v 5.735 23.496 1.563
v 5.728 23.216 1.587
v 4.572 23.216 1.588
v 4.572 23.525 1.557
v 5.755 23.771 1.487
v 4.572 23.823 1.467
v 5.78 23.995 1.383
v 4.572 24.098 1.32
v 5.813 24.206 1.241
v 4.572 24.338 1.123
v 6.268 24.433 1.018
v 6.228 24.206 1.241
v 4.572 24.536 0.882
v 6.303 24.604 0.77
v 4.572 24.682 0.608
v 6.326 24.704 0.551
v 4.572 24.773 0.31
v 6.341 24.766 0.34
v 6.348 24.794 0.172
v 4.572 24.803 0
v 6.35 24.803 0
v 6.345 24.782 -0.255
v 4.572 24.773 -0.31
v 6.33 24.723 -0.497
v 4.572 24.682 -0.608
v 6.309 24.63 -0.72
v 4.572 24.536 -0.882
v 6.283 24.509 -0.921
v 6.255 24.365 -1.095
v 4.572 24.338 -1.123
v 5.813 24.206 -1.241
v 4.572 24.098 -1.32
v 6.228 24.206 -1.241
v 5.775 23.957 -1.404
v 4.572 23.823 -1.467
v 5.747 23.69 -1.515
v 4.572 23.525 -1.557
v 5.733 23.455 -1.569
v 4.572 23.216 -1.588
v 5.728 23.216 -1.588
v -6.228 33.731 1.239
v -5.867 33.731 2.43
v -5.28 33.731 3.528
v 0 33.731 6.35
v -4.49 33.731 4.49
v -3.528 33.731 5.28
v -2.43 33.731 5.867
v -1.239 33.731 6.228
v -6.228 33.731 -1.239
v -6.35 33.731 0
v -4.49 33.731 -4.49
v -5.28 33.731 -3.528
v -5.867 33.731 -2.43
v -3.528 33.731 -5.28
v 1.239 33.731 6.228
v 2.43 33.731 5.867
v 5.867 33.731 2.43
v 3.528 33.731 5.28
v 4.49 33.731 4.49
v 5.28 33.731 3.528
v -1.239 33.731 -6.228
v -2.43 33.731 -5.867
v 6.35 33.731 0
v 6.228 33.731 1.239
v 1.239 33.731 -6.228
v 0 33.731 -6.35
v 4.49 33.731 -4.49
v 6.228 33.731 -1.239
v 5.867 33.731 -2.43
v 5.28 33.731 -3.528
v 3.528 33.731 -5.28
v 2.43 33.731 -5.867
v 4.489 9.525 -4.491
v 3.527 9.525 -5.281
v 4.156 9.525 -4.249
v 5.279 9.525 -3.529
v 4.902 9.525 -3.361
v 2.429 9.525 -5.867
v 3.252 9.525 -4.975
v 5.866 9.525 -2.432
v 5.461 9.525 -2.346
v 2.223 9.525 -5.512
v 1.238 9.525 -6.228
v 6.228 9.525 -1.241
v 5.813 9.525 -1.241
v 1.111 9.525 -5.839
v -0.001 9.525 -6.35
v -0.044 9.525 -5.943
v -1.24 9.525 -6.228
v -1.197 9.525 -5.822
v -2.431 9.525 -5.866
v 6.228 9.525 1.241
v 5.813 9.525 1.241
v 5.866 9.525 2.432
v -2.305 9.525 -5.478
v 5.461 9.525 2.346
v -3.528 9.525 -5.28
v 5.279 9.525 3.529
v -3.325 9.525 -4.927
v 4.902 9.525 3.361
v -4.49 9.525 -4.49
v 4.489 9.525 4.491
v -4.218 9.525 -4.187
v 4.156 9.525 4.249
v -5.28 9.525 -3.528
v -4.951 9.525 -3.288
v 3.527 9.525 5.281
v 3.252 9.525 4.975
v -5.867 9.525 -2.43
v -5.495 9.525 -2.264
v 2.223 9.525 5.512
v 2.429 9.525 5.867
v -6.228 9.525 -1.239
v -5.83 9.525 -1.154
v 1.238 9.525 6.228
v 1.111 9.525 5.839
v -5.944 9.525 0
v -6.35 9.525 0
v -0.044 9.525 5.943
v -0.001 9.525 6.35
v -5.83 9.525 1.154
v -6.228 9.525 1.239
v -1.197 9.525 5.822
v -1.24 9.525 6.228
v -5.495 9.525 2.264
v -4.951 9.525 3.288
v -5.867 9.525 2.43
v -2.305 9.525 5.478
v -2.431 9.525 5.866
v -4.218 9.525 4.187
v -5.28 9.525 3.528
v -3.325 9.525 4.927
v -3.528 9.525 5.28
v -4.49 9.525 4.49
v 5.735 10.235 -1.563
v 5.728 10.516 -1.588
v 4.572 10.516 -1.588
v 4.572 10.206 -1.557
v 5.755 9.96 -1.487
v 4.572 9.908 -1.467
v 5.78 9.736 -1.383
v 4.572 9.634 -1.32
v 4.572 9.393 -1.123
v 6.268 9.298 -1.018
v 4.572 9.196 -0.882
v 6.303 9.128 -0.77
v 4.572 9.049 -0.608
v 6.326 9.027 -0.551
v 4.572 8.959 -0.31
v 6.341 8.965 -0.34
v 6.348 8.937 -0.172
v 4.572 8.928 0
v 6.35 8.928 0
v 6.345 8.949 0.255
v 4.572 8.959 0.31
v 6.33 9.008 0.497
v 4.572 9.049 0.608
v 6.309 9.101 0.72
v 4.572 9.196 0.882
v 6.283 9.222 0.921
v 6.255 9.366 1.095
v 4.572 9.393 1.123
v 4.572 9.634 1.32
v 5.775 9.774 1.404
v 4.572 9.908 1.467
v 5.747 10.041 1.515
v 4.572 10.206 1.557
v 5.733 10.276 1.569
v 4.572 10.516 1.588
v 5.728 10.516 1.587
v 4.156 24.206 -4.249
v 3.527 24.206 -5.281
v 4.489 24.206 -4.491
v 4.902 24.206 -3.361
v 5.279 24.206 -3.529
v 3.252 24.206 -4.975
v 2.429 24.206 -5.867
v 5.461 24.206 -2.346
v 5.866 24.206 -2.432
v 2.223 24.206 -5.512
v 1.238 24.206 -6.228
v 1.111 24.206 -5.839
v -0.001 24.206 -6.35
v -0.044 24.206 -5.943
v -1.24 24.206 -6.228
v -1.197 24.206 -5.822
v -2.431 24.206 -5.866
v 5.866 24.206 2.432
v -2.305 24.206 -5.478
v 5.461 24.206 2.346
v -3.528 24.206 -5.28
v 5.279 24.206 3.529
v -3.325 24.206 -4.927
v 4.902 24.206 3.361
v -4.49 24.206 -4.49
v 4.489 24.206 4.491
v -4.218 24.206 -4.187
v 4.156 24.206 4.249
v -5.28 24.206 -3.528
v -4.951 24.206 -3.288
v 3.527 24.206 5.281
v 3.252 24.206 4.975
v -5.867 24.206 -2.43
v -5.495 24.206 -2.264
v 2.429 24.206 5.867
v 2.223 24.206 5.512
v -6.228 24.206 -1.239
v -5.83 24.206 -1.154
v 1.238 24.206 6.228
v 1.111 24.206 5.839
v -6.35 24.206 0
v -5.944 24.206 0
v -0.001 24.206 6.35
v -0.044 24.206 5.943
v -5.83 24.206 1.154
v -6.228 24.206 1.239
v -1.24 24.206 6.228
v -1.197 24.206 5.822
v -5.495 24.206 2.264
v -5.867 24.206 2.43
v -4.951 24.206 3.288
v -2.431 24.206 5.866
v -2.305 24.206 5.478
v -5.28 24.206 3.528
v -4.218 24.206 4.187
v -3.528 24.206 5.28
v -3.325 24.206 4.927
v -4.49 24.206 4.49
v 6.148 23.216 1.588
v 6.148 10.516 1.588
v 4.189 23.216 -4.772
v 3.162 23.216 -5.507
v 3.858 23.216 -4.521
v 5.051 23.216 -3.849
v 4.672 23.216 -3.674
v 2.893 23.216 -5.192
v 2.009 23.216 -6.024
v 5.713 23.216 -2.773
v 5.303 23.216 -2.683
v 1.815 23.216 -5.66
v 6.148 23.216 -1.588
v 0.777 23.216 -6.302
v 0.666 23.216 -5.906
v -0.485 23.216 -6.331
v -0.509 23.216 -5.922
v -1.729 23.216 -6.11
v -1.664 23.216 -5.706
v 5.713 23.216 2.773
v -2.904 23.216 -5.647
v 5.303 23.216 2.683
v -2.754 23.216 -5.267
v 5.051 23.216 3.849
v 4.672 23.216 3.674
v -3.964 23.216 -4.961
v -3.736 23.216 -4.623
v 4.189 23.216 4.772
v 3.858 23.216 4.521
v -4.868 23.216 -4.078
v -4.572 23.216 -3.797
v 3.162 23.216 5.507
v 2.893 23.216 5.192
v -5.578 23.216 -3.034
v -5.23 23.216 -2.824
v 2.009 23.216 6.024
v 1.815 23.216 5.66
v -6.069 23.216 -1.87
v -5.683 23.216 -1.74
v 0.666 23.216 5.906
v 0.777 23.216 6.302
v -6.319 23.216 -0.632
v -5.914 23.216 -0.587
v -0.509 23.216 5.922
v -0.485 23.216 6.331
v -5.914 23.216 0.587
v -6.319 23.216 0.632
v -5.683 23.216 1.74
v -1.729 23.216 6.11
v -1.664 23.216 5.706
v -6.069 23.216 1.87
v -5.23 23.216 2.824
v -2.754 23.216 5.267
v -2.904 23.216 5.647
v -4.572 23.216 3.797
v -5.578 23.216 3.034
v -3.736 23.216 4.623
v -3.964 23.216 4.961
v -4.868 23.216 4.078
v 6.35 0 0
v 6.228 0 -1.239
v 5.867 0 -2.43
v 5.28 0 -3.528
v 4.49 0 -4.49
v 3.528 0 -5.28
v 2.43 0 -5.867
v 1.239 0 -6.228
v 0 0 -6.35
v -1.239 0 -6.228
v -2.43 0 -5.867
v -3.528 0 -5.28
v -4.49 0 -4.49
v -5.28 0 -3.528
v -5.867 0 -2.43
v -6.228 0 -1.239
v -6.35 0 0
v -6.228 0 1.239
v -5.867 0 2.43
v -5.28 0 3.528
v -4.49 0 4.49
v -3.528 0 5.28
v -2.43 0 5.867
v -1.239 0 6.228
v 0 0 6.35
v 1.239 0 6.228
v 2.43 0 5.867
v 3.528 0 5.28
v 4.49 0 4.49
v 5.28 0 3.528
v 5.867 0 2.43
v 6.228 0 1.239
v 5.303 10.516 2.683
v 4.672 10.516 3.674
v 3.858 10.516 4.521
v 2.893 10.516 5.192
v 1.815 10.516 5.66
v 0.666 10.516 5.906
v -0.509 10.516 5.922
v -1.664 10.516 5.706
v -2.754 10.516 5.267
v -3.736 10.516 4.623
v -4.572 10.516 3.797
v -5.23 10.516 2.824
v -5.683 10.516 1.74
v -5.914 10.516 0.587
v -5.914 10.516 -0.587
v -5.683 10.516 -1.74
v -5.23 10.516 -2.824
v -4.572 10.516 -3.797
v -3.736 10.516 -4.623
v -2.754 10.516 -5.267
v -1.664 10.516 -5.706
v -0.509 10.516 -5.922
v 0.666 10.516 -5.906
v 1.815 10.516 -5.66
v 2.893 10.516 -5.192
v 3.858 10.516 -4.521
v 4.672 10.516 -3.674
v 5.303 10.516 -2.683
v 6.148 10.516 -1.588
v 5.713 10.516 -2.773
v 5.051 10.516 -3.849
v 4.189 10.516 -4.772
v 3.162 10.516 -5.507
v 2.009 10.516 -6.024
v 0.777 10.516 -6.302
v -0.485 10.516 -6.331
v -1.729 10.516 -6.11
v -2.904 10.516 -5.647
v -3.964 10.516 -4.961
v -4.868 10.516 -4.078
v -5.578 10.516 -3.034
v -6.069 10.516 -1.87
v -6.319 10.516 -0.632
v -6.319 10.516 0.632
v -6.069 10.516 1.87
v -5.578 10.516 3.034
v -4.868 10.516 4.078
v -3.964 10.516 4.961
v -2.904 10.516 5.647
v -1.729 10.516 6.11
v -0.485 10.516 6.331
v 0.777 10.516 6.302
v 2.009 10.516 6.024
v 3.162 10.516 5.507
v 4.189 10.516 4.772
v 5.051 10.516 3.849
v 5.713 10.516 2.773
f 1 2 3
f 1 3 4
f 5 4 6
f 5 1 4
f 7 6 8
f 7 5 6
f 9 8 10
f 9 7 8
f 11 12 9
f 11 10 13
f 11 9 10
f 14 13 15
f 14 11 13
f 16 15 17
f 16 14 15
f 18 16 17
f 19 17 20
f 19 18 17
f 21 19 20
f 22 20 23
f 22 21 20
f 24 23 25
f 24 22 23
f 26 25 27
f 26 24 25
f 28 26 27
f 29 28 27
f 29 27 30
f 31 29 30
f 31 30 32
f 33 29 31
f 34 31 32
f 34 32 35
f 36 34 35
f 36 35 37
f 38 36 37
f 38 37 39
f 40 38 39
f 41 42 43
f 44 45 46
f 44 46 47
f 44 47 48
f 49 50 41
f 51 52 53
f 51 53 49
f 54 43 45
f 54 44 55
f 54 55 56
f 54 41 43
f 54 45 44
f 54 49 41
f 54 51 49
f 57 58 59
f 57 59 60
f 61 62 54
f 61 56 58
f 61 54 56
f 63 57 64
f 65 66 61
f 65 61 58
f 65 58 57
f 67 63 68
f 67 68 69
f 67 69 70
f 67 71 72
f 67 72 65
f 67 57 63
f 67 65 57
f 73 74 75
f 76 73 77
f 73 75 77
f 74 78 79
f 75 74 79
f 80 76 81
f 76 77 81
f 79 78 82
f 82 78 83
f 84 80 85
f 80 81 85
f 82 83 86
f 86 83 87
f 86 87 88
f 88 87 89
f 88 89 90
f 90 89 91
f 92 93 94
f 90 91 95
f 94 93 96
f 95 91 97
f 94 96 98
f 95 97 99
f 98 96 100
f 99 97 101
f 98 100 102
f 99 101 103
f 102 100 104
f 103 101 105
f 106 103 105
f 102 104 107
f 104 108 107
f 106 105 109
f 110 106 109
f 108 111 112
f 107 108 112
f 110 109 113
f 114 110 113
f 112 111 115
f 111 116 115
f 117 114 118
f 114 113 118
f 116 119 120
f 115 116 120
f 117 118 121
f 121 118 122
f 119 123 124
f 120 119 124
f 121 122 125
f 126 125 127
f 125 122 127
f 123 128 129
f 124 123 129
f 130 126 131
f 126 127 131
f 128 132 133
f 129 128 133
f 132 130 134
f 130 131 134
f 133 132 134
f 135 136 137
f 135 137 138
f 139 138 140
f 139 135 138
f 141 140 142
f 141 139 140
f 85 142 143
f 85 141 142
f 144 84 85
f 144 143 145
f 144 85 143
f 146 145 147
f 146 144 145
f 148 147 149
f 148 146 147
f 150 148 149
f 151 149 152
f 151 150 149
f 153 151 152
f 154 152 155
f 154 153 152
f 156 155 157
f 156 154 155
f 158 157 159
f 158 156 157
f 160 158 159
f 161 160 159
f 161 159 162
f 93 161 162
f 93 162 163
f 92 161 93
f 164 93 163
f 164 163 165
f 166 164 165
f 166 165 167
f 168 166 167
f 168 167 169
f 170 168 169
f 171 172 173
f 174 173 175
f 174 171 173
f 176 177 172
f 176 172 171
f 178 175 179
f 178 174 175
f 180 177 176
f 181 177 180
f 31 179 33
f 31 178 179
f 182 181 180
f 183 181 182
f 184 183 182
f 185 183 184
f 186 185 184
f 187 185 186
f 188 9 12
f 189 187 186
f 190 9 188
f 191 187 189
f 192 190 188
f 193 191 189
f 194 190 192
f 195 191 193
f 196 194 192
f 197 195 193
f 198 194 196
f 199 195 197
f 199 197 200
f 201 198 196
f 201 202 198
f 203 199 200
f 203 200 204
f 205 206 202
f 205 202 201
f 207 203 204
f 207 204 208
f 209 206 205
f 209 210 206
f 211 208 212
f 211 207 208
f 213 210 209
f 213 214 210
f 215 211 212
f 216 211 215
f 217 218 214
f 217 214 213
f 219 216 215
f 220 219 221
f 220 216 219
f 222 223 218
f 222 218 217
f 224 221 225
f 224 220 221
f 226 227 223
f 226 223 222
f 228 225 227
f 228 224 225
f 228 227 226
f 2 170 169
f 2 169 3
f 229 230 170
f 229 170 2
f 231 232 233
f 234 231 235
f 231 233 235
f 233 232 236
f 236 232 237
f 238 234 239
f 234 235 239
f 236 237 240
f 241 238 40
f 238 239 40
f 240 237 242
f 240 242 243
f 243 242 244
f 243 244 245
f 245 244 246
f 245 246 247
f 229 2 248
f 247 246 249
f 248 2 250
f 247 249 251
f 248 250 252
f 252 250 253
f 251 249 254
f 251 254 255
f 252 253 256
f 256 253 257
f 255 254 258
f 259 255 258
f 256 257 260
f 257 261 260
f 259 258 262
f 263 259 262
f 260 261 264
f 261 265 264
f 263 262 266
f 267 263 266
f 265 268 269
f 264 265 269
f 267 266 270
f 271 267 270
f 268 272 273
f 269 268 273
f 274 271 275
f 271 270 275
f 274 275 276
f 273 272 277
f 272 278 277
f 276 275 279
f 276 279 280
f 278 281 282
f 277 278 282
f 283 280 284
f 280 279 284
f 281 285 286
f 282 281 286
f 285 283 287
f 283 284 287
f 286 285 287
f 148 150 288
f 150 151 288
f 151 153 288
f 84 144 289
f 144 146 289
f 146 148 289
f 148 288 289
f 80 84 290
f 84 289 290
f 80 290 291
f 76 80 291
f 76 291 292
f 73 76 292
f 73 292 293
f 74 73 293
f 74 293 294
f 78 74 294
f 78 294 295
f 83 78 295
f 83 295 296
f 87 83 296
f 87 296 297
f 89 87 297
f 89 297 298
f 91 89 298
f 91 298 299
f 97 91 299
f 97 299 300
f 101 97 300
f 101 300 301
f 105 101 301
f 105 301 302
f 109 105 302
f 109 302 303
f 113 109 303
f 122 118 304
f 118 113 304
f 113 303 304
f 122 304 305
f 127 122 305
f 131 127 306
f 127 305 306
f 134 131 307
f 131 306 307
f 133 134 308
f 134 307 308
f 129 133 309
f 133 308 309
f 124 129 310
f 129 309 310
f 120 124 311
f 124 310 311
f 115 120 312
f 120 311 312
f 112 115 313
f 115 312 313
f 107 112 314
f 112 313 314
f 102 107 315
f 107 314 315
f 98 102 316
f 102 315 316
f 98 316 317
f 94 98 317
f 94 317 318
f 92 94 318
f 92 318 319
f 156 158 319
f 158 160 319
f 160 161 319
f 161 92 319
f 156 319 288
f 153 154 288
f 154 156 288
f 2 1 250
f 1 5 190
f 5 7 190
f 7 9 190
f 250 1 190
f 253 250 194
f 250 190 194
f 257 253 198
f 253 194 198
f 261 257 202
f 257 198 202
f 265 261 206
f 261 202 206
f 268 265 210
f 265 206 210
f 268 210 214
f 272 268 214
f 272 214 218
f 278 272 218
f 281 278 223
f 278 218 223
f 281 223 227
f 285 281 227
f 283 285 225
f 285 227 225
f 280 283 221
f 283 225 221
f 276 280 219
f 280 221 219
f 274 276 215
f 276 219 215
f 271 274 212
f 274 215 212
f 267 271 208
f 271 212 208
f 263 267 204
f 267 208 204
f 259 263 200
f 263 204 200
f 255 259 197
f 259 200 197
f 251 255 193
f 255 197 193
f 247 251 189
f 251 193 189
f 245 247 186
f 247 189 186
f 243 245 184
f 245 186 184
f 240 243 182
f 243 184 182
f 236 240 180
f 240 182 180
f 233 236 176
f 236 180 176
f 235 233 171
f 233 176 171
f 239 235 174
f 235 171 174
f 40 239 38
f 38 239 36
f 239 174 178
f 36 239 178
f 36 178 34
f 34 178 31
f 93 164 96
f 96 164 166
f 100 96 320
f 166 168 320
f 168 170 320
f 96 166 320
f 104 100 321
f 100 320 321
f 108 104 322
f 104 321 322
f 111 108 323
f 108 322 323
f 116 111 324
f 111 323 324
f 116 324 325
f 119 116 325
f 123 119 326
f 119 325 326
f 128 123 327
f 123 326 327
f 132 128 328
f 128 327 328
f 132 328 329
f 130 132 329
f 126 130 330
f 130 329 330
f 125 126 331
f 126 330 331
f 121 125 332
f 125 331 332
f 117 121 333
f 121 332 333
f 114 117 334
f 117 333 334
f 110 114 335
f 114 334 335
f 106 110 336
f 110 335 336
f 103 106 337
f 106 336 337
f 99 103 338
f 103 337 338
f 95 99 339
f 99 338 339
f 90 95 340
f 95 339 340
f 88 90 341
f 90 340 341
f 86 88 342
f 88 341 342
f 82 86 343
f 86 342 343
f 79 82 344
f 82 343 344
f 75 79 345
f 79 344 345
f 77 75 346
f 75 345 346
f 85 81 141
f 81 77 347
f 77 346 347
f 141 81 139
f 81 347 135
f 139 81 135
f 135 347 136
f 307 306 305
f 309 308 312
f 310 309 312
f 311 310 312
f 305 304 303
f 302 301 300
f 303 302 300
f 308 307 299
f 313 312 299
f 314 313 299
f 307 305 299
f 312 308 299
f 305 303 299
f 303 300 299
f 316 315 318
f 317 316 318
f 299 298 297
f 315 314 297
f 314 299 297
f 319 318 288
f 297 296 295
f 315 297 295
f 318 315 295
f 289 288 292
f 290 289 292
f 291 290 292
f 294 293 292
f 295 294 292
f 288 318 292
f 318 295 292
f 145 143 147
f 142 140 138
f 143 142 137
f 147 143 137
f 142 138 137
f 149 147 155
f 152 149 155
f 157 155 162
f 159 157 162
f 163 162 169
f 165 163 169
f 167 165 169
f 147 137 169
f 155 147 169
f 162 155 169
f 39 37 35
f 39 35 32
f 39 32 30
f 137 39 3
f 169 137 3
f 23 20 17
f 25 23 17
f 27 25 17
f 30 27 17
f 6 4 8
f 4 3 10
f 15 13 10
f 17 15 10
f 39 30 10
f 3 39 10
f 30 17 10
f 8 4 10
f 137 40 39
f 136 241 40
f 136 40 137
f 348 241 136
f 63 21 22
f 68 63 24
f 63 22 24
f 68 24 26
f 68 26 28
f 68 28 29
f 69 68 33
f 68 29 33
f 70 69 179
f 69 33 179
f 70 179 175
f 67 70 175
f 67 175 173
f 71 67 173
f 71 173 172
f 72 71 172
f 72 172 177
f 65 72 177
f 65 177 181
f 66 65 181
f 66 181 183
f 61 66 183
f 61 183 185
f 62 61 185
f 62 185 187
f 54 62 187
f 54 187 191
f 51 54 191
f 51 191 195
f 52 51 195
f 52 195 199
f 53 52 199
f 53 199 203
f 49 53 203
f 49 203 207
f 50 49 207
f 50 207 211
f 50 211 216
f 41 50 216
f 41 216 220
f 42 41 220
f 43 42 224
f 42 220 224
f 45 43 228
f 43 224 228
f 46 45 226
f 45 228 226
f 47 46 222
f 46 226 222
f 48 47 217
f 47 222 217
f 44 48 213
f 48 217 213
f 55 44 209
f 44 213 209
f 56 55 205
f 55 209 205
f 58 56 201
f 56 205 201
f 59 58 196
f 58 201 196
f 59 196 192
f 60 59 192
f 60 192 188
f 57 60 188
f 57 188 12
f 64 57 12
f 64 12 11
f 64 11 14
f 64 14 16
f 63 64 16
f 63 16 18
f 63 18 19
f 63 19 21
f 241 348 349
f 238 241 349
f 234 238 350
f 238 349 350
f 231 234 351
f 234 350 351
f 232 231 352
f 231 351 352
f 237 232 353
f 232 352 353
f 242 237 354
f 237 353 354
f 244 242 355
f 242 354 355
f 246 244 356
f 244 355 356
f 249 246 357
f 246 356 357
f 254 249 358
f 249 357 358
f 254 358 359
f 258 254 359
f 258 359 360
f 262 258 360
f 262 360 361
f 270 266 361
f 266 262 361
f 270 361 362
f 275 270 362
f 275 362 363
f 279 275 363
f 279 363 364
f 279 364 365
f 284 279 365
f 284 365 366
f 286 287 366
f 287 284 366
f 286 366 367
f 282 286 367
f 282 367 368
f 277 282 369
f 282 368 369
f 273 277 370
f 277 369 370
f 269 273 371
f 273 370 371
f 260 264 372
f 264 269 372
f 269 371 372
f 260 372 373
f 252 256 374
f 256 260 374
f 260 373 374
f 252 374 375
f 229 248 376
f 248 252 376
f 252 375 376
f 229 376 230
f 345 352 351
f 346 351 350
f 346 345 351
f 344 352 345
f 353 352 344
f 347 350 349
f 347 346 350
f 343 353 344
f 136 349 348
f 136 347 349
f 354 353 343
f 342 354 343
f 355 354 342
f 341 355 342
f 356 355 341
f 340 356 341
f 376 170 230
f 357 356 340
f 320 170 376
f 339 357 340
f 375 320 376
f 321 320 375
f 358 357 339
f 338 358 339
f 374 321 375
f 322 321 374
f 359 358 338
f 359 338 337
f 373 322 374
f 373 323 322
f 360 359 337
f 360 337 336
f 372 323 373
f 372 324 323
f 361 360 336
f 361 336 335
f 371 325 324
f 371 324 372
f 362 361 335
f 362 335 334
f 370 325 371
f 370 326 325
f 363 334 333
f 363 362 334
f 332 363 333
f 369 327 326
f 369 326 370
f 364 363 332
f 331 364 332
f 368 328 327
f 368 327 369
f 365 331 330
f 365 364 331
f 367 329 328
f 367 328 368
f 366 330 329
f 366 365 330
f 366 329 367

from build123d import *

# Parameters (mm, degrees)
SKETCH1_R           = 6.35
BOSS_EXTRUDE1_DEPTH = 33.7312
SKETCH2_W           = 20.748446766
SKETCH2_H           = 0.9906
SKETCH3_W           = 15.336822943
SKETCH3_H           = 0.9906
CUT_EXTRUDE1_DEPTH  = 1.778


with BuildPart() as part:
    # Sketch1 → Boss-Extrude1 (new body)
    with BuildSketch(Plane(origin=(0, 0, 0), x_dir=(1, 0, 0), z_dir=(0, 1, 0))):
        Circle(SKETCH1_R)
    extrude(amount=BOSS_EXTRUDE1_DEPTH)

    # Sketch2 → Cut-Revolve1 (revolve, cut)
    with BuildSketch(Plane(origin=(0, 0, 0), x_dir=(0, 0, -1), z_dir=(1, 0, 0))):
        with Locations((-16.317823383, 23.7109)):
            Rectangle(SKETCH2_W, SKETCH2_H)
    revolve(axis=Axis((0, 25.517050234, 0), (0, -1, 0)), mode=Mode.SUBTRACT)

    # Sketch3 → Cut-Revolve2 (revolve, cut)
    with BuildSketch(Plane(origin=(0, 0, 0), x_dir=(0, 0, -1), z_dir=(1, 0, 0))):
        with Locations((-13.612011472, 10.0203)):
            Rectangle(SKETCH3_W, SKETCH3_H)
    revolve(axis=Axis((0, 15.810643297, 0), (0, -1, 0)), mode=Mode.SUBTRACT)

    # Sketch4 → Cut-Extrude1 (cut)
    with BuildSketch(Plane(origin=(6.35, 0, 0), x_dir=(0, 0, -1), z_dir=(1, 0, 0))):
        with BuildLine():
            Line((1.5875, 23.2156), (1.5875, 10.5156))
            ThreePointArc((1.5875, 10.5156), (0, 8.9281), (-1.5875, 10.5156))
            Line((-1.5875, 10.5156), (-1.5875, 23.2156))
            ThreePointArc((-1.5875, 23.2156), (0, 24.8031), (1.5875, 23.2156))
        make_face()
    extrude(amount=-CUT_EXTRUDE1_DEPTH, mode=Mode.SUBTRACT)


solid = part.part
